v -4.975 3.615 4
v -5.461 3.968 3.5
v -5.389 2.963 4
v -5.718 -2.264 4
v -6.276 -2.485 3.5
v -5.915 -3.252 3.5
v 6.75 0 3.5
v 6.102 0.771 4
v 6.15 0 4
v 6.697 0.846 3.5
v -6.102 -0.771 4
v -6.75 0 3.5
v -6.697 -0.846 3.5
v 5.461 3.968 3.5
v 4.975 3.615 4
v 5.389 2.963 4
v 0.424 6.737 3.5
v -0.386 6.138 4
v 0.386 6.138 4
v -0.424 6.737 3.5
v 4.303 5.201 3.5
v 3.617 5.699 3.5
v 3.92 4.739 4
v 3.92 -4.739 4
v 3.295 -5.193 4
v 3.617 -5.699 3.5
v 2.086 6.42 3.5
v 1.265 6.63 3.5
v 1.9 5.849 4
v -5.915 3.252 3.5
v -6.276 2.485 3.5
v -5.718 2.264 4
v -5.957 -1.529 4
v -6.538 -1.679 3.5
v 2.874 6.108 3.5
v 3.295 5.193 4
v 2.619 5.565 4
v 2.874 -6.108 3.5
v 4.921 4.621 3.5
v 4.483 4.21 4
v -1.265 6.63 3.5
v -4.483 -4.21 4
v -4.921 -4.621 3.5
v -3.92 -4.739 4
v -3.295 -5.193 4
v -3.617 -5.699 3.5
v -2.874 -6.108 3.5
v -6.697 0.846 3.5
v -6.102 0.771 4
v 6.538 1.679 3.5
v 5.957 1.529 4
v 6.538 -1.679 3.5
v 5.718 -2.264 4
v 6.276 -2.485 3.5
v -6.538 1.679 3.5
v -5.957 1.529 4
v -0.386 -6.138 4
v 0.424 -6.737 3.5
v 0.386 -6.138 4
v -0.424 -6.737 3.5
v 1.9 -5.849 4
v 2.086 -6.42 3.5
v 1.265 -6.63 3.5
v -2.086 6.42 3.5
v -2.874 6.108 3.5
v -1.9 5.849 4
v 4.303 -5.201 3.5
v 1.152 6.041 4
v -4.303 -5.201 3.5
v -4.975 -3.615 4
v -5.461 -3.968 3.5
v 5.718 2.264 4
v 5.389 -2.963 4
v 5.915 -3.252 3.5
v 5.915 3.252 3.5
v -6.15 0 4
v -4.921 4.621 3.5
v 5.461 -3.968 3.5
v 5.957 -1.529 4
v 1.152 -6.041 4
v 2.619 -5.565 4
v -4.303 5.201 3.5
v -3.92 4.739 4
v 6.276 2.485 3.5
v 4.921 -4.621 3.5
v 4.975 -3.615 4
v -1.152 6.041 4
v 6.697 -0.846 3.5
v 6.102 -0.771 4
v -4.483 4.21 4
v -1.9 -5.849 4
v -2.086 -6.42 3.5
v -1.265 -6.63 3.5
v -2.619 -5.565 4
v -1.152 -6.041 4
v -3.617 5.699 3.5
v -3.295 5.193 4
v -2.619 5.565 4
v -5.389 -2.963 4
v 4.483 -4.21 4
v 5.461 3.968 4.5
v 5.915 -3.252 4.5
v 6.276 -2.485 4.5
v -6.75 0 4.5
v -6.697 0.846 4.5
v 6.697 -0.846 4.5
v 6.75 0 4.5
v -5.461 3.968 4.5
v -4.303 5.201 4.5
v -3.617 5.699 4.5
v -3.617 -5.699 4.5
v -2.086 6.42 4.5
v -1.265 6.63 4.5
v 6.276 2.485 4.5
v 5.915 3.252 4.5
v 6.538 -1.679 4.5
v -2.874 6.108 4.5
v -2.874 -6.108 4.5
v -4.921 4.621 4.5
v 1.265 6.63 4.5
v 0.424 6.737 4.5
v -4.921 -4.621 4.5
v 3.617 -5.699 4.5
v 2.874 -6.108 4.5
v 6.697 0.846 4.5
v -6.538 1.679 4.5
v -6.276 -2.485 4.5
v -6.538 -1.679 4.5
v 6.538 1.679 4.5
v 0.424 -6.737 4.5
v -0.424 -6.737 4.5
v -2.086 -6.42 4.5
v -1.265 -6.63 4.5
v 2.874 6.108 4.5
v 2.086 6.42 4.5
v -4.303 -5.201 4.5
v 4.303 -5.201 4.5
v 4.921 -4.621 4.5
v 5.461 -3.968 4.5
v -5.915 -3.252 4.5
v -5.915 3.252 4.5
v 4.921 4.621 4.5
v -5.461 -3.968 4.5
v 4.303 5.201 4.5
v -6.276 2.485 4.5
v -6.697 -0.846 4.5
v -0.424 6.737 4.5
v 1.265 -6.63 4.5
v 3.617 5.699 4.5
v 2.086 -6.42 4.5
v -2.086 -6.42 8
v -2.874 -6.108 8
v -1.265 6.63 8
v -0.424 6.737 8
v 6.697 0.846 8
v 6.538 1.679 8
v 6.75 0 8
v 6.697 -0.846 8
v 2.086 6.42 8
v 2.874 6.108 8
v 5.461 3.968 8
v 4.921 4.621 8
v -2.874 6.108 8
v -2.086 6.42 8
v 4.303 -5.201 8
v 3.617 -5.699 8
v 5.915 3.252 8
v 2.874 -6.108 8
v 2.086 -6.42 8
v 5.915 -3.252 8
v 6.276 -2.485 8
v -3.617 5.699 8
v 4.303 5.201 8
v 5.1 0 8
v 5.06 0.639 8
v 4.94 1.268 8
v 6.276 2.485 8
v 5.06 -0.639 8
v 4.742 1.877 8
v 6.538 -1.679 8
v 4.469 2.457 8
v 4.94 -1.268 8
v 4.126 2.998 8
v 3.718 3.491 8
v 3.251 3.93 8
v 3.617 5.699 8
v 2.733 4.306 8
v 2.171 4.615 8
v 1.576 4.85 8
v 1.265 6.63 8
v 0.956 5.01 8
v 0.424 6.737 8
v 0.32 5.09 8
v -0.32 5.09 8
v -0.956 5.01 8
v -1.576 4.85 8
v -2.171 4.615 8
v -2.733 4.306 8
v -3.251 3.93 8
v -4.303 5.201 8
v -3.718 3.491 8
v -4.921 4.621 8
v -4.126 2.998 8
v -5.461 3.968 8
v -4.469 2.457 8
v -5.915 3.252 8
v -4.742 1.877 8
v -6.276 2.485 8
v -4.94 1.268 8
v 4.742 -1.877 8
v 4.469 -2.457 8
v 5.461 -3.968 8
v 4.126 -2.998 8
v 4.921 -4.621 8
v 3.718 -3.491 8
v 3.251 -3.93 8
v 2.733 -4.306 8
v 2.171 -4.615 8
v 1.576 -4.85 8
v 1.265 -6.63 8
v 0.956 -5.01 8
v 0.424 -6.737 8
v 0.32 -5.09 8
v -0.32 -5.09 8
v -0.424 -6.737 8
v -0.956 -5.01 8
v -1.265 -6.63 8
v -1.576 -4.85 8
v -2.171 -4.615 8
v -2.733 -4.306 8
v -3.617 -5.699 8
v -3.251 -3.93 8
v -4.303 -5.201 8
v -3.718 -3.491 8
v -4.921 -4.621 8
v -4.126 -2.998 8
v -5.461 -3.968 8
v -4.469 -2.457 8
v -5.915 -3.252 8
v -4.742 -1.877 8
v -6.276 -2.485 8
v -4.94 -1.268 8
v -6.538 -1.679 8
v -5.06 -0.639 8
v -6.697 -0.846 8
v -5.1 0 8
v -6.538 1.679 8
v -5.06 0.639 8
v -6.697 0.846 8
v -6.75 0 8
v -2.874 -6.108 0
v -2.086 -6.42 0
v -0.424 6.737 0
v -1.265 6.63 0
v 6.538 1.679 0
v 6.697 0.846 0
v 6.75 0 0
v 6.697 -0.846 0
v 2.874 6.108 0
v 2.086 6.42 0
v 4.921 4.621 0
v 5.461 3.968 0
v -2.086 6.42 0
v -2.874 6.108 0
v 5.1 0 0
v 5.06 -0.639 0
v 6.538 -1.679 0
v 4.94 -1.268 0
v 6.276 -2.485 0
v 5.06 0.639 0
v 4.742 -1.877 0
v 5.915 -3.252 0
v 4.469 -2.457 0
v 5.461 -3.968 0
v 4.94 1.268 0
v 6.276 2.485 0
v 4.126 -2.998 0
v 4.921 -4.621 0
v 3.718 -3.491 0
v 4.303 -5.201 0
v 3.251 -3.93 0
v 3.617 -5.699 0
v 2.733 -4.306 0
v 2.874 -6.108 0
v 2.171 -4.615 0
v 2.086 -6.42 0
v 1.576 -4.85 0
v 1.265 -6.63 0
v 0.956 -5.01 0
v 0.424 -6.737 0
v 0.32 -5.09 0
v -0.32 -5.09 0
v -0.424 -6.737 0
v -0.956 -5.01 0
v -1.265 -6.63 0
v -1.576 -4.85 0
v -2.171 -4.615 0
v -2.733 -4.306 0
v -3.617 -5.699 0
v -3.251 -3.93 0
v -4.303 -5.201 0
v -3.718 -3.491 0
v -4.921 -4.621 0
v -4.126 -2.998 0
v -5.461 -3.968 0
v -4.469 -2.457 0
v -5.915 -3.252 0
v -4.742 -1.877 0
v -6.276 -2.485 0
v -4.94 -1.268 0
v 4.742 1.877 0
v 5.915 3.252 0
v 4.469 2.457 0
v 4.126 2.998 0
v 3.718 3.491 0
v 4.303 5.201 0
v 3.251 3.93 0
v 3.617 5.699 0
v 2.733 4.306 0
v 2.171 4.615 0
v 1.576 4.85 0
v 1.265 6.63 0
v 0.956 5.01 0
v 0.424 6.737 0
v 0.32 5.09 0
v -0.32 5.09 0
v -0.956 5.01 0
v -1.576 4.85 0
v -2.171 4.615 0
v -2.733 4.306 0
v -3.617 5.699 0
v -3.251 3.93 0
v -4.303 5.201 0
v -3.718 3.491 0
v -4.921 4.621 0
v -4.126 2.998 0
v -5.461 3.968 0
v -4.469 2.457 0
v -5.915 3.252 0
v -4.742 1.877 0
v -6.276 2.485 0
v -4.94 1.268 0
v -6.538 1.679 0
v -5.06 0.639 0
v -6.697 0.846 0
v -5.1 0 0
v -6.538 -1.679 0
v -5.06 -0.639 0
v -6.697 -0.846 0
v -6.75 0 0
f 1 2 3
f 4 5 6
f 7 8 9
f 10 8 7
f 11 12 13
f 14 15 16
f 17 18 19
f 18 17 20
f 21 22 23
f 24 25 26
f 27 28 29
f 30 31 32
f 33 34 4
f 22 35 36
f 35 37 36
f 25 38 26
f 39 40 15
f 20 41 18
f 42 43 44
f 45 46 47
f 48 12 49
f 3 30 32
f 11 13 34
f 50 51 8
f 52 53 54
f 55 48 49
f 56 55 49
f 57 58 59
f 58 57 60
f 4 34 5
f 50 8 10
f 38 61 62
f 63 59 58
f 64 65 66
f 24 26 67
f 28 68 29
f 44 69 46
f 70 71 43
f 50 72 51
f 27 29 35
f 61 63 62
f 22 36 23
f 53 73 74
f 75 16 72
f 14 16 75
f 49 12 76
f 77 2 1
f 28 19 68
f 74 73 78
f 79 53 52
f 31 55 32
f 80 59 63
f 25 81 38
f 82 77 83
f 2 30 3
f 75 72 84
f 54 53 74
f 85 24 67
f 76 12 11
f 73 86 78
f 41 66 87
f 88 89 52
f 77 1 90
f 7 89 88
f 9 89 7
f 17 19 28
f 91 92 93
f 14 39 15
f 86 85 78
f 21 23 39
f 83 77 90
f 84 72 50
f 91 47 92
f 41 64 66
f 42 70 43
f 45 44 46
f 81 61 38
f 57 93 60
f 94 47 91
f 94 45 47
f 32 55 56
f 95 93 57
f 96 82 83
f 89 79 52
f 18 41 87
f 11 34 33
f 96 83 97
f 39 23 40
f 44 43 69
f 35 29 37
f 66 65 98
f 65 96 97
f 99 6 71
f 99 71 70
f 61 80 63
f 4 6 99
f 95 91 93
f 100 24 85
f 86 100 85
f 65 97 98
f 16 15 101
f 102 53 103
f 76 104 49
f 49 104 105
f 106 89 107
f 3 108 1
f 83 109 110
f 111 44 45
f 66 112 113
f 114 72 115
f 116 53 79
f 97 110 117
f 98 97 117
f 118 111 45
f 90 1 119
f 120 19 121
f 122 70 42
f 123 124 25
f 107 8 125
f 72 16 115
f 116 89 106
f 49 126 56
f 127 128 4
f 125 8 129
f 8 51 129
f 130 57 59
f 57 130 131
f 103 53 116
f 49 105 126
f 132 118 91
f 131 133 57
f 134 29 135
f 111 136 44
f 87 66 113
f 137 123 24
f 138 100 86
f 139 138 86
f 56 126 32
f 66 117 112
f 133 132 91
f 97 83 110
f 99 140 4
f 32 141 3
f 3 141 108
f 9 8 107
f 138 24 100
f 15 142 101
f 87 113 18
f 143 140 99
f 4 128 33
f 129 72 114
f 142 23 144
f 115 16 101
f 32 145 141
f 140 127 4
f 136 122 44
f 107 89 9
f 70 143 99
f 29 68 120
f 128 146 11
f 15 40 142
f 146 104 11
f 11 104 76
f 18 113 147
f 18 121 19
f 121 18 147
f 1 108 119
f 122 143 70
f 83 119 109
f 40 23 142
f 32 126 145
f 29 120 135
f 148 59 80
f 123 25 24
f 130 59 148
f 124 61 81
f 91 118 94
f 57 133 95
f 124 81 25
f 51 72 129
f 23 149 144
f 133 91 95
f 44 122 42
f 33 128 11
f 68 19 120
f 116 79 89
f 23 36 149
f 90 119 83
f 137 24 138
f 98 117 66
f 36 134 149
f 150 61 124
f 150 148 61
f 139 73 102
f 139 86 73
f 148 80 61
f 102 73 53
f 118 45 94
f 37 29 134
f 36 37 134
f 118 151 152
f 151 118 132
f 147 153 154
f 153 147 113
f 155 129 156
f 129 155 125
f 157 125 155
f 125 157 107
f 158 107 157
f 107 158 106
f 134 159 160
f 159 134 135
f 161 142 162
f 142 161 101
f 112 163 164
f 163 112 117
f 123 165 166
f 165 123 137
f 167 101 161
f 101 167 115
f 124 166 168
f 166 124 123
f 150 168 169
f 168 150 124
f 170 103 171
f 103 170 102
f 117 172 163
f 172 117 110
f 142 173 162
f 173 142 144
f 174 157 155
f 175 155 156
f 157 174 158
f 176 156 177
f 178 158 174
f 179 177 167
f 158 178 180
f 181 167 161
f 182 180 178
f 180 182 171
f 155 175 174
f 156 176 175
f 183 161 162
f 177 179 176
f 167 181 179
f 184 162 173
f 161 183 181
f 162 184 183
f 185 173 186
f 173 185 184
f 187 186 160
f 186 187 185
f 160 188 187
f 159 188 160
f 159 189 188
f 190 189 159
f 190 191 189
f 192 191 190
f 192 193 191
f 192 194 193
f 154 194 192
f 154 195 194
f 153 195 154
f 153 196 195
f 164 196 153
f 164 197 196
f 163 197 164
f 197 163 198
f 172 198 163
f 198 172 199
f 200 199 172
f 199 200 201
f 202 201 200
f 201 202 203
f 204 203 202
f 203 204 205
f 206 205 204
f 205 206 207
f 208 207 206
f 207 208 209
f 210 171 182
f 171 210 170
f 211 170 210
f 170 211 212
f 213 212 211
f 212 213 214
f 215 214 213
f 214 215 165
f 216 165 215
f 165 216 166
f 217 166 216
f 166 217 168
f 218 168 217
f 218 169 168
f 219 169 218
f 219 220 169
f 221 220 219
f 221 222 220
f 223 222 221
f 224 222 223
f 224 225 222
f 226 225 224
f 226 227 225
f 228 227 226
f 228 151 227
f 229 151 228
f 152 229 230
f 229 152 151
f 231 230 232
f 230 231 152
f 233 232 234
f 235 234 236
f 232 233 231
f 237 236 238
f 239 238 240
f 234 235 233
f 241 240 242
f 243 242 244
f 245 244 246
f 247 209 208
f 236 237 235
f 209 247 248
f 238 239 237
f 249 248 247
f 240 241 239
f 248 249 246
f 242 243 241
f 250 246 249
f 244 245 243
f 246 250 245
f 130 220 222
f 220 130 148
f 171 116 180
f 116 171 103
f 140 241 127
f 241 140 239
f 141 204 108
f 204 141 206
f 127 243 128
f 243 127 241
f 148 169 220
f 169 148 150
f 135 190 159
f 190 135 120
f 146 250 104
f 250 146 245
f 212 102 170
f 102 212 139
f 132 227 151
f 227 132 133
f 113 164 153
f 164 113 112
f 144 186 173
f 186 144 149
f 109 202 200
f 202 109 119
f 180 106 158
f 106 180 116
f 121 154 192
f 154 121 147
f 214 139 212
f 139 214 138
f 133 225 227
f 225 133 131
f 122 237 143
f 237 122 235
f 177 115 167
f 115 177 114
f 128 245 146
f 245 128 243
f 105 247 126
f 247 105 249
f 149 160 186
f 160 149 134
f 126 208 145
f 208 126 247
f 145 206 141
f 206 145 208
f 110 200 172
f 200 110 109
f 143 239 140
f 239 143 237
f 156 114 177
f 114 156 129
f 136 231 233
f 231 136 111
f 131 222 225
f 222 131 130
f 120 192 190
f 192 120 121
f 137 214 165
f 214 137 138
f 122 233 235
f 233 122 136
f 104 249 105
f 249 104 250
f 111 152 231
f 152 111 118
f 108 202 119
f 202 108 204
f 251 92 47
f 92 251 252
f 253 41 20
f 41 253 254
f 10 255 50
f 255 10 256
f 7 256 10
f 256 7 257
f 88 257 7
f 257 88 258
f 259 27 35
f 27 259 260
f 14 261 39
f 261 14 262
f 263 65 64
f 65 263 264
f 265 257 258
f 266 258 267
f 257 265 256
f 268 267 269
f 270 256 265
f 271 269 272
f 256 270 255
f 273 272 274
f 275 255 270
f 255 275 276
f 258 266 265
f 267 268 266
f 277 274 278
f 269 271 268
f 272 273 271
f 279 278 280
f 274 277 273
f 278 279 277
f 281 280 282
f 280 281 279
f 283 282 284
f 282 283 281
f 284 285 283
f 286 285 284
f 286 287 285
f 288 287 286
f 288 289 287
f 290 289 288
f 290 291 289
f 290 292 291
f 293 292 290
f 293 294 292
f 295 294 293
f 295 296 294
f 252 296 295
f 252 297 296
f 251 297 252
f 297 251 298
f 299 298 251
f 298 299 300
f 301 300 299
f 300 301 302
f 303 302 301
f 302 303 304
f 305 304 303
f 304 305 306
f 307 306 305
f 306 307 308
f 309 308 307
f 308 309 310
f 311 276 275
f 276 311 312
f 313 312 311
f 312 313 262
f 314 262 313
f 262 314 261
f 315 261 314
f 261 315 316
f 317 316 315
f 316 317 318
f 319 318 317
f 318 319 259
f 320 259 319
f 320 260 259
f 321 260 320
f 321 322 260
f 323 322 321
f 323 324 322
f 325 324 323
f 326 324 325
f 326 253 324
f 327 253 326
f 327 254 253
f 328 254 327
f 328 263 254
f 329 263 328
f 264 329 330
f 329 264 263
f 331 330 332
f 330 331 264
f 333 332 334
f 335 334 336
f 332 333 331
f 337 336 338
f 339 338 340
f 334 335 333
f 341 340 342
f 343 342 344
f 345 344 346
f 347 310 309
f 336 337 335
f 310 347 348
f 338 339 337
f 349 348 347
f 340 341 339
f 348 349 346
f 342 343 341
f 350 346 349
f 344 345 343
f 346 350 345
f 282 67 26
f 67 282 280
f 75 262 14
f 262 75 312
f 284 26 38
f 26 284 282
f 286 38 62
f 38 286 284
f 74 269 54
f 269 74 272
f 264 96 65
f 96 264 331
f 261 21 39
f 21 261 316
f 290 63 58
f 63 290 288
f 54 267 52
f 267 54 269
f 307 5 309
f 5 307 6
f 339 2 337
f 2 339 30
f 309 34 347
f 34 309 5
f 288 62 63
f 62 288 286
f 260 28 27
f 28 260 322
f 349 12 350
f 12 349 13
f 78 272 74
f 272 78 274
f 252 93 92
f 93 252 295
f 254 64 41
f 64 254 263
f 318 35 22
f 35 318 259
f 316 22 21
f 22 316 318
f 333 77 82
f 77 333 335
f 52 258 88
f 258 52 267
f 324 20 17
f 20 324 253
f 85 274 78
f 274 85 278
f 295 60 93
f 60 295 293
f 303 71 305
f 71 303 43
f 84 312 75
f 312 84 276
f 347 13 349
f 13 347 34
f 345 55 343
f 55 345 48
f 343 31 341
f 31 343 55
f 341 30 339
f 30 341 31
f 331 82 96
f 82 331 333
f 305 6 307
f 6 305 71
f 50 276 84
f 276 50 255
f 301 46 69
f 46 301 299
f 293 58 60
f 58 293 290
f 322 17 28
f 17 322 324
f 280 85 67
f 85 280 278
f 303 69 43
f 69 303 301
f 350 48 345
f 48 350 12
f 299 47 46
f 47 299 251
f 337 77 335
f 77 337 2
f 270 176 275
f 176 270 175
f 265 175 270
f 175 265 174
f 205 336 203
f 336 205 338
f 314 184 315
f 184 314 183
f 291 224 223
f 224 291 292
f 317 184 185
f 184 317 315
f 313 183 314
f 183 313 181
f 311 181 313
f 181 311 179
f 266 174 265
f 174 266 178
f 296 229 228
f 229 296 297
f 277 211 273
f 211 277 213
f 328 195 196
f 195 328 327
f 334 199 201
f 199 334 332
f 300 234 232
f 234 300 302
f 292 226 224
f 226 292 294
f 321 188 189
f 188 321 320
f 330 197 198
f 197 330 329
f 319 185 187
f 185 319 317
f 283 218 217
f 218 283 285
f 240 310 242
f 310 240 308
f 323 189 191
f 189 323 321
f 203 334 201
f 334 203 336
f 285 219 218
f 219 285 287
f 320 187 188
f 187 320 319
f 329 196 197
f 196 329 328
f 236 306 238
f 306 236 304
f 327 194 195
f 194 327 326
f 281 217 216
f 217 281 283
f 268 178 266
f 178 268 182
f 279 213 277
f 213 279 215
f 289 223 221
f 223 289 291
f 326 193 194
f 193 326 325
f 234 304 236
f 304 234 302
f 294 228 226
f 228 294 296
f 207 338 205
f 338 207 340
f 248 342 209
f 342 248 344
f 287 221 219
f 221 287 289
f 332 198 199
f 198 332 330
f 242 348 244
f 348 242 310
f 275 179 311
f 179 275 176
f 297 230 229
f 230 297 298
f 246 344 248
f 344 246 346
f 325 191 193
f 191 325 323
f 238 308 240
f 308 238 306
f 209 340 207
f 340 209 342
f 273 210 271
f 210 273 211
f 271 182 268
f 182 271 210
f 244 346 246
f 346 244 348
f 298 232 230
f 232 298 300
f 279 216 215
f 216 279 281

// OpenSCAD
outerDia = 13.5;

innerDia = 10.2;

grooveDia = 12.3;

grooveHeight = 1;

overallHeight = 8;

module pulley(outerDia, innerDia, midDia, midHeight, height){
    difference(){
        union(){
            translate([0,0,(height-midHeight)/2]) cylinder(h=midHeight/2, r1=outerDia/2, r2=midDia/2,$fn=50);
            translate([0,0,midHeight+(height-midHeight)/2]) rotate([0,180,0]) cylinder(h=midHeight/2, r1=outerDia/2, r2=midDia/2,$fn=50);
            translate([0,0,midHeight+(height-midHeight)/2]) cylinder(h=(height-midHeight)/2, r=outerDia/2,$fn=50);
            translate([0,0,0]) cylinder(h=(height-midHeight)/2, r=outerDia/2,$fn=50);
        }
        translate([0,0,-0.01]) cylinder(h=height+0.02,r=innerDia/2,$fn=50);
    }
}
     // OD   ID  MD  MH, H
pulley(outerDia, innerDia, grooveDia, grooveHeight, overallHeight);
